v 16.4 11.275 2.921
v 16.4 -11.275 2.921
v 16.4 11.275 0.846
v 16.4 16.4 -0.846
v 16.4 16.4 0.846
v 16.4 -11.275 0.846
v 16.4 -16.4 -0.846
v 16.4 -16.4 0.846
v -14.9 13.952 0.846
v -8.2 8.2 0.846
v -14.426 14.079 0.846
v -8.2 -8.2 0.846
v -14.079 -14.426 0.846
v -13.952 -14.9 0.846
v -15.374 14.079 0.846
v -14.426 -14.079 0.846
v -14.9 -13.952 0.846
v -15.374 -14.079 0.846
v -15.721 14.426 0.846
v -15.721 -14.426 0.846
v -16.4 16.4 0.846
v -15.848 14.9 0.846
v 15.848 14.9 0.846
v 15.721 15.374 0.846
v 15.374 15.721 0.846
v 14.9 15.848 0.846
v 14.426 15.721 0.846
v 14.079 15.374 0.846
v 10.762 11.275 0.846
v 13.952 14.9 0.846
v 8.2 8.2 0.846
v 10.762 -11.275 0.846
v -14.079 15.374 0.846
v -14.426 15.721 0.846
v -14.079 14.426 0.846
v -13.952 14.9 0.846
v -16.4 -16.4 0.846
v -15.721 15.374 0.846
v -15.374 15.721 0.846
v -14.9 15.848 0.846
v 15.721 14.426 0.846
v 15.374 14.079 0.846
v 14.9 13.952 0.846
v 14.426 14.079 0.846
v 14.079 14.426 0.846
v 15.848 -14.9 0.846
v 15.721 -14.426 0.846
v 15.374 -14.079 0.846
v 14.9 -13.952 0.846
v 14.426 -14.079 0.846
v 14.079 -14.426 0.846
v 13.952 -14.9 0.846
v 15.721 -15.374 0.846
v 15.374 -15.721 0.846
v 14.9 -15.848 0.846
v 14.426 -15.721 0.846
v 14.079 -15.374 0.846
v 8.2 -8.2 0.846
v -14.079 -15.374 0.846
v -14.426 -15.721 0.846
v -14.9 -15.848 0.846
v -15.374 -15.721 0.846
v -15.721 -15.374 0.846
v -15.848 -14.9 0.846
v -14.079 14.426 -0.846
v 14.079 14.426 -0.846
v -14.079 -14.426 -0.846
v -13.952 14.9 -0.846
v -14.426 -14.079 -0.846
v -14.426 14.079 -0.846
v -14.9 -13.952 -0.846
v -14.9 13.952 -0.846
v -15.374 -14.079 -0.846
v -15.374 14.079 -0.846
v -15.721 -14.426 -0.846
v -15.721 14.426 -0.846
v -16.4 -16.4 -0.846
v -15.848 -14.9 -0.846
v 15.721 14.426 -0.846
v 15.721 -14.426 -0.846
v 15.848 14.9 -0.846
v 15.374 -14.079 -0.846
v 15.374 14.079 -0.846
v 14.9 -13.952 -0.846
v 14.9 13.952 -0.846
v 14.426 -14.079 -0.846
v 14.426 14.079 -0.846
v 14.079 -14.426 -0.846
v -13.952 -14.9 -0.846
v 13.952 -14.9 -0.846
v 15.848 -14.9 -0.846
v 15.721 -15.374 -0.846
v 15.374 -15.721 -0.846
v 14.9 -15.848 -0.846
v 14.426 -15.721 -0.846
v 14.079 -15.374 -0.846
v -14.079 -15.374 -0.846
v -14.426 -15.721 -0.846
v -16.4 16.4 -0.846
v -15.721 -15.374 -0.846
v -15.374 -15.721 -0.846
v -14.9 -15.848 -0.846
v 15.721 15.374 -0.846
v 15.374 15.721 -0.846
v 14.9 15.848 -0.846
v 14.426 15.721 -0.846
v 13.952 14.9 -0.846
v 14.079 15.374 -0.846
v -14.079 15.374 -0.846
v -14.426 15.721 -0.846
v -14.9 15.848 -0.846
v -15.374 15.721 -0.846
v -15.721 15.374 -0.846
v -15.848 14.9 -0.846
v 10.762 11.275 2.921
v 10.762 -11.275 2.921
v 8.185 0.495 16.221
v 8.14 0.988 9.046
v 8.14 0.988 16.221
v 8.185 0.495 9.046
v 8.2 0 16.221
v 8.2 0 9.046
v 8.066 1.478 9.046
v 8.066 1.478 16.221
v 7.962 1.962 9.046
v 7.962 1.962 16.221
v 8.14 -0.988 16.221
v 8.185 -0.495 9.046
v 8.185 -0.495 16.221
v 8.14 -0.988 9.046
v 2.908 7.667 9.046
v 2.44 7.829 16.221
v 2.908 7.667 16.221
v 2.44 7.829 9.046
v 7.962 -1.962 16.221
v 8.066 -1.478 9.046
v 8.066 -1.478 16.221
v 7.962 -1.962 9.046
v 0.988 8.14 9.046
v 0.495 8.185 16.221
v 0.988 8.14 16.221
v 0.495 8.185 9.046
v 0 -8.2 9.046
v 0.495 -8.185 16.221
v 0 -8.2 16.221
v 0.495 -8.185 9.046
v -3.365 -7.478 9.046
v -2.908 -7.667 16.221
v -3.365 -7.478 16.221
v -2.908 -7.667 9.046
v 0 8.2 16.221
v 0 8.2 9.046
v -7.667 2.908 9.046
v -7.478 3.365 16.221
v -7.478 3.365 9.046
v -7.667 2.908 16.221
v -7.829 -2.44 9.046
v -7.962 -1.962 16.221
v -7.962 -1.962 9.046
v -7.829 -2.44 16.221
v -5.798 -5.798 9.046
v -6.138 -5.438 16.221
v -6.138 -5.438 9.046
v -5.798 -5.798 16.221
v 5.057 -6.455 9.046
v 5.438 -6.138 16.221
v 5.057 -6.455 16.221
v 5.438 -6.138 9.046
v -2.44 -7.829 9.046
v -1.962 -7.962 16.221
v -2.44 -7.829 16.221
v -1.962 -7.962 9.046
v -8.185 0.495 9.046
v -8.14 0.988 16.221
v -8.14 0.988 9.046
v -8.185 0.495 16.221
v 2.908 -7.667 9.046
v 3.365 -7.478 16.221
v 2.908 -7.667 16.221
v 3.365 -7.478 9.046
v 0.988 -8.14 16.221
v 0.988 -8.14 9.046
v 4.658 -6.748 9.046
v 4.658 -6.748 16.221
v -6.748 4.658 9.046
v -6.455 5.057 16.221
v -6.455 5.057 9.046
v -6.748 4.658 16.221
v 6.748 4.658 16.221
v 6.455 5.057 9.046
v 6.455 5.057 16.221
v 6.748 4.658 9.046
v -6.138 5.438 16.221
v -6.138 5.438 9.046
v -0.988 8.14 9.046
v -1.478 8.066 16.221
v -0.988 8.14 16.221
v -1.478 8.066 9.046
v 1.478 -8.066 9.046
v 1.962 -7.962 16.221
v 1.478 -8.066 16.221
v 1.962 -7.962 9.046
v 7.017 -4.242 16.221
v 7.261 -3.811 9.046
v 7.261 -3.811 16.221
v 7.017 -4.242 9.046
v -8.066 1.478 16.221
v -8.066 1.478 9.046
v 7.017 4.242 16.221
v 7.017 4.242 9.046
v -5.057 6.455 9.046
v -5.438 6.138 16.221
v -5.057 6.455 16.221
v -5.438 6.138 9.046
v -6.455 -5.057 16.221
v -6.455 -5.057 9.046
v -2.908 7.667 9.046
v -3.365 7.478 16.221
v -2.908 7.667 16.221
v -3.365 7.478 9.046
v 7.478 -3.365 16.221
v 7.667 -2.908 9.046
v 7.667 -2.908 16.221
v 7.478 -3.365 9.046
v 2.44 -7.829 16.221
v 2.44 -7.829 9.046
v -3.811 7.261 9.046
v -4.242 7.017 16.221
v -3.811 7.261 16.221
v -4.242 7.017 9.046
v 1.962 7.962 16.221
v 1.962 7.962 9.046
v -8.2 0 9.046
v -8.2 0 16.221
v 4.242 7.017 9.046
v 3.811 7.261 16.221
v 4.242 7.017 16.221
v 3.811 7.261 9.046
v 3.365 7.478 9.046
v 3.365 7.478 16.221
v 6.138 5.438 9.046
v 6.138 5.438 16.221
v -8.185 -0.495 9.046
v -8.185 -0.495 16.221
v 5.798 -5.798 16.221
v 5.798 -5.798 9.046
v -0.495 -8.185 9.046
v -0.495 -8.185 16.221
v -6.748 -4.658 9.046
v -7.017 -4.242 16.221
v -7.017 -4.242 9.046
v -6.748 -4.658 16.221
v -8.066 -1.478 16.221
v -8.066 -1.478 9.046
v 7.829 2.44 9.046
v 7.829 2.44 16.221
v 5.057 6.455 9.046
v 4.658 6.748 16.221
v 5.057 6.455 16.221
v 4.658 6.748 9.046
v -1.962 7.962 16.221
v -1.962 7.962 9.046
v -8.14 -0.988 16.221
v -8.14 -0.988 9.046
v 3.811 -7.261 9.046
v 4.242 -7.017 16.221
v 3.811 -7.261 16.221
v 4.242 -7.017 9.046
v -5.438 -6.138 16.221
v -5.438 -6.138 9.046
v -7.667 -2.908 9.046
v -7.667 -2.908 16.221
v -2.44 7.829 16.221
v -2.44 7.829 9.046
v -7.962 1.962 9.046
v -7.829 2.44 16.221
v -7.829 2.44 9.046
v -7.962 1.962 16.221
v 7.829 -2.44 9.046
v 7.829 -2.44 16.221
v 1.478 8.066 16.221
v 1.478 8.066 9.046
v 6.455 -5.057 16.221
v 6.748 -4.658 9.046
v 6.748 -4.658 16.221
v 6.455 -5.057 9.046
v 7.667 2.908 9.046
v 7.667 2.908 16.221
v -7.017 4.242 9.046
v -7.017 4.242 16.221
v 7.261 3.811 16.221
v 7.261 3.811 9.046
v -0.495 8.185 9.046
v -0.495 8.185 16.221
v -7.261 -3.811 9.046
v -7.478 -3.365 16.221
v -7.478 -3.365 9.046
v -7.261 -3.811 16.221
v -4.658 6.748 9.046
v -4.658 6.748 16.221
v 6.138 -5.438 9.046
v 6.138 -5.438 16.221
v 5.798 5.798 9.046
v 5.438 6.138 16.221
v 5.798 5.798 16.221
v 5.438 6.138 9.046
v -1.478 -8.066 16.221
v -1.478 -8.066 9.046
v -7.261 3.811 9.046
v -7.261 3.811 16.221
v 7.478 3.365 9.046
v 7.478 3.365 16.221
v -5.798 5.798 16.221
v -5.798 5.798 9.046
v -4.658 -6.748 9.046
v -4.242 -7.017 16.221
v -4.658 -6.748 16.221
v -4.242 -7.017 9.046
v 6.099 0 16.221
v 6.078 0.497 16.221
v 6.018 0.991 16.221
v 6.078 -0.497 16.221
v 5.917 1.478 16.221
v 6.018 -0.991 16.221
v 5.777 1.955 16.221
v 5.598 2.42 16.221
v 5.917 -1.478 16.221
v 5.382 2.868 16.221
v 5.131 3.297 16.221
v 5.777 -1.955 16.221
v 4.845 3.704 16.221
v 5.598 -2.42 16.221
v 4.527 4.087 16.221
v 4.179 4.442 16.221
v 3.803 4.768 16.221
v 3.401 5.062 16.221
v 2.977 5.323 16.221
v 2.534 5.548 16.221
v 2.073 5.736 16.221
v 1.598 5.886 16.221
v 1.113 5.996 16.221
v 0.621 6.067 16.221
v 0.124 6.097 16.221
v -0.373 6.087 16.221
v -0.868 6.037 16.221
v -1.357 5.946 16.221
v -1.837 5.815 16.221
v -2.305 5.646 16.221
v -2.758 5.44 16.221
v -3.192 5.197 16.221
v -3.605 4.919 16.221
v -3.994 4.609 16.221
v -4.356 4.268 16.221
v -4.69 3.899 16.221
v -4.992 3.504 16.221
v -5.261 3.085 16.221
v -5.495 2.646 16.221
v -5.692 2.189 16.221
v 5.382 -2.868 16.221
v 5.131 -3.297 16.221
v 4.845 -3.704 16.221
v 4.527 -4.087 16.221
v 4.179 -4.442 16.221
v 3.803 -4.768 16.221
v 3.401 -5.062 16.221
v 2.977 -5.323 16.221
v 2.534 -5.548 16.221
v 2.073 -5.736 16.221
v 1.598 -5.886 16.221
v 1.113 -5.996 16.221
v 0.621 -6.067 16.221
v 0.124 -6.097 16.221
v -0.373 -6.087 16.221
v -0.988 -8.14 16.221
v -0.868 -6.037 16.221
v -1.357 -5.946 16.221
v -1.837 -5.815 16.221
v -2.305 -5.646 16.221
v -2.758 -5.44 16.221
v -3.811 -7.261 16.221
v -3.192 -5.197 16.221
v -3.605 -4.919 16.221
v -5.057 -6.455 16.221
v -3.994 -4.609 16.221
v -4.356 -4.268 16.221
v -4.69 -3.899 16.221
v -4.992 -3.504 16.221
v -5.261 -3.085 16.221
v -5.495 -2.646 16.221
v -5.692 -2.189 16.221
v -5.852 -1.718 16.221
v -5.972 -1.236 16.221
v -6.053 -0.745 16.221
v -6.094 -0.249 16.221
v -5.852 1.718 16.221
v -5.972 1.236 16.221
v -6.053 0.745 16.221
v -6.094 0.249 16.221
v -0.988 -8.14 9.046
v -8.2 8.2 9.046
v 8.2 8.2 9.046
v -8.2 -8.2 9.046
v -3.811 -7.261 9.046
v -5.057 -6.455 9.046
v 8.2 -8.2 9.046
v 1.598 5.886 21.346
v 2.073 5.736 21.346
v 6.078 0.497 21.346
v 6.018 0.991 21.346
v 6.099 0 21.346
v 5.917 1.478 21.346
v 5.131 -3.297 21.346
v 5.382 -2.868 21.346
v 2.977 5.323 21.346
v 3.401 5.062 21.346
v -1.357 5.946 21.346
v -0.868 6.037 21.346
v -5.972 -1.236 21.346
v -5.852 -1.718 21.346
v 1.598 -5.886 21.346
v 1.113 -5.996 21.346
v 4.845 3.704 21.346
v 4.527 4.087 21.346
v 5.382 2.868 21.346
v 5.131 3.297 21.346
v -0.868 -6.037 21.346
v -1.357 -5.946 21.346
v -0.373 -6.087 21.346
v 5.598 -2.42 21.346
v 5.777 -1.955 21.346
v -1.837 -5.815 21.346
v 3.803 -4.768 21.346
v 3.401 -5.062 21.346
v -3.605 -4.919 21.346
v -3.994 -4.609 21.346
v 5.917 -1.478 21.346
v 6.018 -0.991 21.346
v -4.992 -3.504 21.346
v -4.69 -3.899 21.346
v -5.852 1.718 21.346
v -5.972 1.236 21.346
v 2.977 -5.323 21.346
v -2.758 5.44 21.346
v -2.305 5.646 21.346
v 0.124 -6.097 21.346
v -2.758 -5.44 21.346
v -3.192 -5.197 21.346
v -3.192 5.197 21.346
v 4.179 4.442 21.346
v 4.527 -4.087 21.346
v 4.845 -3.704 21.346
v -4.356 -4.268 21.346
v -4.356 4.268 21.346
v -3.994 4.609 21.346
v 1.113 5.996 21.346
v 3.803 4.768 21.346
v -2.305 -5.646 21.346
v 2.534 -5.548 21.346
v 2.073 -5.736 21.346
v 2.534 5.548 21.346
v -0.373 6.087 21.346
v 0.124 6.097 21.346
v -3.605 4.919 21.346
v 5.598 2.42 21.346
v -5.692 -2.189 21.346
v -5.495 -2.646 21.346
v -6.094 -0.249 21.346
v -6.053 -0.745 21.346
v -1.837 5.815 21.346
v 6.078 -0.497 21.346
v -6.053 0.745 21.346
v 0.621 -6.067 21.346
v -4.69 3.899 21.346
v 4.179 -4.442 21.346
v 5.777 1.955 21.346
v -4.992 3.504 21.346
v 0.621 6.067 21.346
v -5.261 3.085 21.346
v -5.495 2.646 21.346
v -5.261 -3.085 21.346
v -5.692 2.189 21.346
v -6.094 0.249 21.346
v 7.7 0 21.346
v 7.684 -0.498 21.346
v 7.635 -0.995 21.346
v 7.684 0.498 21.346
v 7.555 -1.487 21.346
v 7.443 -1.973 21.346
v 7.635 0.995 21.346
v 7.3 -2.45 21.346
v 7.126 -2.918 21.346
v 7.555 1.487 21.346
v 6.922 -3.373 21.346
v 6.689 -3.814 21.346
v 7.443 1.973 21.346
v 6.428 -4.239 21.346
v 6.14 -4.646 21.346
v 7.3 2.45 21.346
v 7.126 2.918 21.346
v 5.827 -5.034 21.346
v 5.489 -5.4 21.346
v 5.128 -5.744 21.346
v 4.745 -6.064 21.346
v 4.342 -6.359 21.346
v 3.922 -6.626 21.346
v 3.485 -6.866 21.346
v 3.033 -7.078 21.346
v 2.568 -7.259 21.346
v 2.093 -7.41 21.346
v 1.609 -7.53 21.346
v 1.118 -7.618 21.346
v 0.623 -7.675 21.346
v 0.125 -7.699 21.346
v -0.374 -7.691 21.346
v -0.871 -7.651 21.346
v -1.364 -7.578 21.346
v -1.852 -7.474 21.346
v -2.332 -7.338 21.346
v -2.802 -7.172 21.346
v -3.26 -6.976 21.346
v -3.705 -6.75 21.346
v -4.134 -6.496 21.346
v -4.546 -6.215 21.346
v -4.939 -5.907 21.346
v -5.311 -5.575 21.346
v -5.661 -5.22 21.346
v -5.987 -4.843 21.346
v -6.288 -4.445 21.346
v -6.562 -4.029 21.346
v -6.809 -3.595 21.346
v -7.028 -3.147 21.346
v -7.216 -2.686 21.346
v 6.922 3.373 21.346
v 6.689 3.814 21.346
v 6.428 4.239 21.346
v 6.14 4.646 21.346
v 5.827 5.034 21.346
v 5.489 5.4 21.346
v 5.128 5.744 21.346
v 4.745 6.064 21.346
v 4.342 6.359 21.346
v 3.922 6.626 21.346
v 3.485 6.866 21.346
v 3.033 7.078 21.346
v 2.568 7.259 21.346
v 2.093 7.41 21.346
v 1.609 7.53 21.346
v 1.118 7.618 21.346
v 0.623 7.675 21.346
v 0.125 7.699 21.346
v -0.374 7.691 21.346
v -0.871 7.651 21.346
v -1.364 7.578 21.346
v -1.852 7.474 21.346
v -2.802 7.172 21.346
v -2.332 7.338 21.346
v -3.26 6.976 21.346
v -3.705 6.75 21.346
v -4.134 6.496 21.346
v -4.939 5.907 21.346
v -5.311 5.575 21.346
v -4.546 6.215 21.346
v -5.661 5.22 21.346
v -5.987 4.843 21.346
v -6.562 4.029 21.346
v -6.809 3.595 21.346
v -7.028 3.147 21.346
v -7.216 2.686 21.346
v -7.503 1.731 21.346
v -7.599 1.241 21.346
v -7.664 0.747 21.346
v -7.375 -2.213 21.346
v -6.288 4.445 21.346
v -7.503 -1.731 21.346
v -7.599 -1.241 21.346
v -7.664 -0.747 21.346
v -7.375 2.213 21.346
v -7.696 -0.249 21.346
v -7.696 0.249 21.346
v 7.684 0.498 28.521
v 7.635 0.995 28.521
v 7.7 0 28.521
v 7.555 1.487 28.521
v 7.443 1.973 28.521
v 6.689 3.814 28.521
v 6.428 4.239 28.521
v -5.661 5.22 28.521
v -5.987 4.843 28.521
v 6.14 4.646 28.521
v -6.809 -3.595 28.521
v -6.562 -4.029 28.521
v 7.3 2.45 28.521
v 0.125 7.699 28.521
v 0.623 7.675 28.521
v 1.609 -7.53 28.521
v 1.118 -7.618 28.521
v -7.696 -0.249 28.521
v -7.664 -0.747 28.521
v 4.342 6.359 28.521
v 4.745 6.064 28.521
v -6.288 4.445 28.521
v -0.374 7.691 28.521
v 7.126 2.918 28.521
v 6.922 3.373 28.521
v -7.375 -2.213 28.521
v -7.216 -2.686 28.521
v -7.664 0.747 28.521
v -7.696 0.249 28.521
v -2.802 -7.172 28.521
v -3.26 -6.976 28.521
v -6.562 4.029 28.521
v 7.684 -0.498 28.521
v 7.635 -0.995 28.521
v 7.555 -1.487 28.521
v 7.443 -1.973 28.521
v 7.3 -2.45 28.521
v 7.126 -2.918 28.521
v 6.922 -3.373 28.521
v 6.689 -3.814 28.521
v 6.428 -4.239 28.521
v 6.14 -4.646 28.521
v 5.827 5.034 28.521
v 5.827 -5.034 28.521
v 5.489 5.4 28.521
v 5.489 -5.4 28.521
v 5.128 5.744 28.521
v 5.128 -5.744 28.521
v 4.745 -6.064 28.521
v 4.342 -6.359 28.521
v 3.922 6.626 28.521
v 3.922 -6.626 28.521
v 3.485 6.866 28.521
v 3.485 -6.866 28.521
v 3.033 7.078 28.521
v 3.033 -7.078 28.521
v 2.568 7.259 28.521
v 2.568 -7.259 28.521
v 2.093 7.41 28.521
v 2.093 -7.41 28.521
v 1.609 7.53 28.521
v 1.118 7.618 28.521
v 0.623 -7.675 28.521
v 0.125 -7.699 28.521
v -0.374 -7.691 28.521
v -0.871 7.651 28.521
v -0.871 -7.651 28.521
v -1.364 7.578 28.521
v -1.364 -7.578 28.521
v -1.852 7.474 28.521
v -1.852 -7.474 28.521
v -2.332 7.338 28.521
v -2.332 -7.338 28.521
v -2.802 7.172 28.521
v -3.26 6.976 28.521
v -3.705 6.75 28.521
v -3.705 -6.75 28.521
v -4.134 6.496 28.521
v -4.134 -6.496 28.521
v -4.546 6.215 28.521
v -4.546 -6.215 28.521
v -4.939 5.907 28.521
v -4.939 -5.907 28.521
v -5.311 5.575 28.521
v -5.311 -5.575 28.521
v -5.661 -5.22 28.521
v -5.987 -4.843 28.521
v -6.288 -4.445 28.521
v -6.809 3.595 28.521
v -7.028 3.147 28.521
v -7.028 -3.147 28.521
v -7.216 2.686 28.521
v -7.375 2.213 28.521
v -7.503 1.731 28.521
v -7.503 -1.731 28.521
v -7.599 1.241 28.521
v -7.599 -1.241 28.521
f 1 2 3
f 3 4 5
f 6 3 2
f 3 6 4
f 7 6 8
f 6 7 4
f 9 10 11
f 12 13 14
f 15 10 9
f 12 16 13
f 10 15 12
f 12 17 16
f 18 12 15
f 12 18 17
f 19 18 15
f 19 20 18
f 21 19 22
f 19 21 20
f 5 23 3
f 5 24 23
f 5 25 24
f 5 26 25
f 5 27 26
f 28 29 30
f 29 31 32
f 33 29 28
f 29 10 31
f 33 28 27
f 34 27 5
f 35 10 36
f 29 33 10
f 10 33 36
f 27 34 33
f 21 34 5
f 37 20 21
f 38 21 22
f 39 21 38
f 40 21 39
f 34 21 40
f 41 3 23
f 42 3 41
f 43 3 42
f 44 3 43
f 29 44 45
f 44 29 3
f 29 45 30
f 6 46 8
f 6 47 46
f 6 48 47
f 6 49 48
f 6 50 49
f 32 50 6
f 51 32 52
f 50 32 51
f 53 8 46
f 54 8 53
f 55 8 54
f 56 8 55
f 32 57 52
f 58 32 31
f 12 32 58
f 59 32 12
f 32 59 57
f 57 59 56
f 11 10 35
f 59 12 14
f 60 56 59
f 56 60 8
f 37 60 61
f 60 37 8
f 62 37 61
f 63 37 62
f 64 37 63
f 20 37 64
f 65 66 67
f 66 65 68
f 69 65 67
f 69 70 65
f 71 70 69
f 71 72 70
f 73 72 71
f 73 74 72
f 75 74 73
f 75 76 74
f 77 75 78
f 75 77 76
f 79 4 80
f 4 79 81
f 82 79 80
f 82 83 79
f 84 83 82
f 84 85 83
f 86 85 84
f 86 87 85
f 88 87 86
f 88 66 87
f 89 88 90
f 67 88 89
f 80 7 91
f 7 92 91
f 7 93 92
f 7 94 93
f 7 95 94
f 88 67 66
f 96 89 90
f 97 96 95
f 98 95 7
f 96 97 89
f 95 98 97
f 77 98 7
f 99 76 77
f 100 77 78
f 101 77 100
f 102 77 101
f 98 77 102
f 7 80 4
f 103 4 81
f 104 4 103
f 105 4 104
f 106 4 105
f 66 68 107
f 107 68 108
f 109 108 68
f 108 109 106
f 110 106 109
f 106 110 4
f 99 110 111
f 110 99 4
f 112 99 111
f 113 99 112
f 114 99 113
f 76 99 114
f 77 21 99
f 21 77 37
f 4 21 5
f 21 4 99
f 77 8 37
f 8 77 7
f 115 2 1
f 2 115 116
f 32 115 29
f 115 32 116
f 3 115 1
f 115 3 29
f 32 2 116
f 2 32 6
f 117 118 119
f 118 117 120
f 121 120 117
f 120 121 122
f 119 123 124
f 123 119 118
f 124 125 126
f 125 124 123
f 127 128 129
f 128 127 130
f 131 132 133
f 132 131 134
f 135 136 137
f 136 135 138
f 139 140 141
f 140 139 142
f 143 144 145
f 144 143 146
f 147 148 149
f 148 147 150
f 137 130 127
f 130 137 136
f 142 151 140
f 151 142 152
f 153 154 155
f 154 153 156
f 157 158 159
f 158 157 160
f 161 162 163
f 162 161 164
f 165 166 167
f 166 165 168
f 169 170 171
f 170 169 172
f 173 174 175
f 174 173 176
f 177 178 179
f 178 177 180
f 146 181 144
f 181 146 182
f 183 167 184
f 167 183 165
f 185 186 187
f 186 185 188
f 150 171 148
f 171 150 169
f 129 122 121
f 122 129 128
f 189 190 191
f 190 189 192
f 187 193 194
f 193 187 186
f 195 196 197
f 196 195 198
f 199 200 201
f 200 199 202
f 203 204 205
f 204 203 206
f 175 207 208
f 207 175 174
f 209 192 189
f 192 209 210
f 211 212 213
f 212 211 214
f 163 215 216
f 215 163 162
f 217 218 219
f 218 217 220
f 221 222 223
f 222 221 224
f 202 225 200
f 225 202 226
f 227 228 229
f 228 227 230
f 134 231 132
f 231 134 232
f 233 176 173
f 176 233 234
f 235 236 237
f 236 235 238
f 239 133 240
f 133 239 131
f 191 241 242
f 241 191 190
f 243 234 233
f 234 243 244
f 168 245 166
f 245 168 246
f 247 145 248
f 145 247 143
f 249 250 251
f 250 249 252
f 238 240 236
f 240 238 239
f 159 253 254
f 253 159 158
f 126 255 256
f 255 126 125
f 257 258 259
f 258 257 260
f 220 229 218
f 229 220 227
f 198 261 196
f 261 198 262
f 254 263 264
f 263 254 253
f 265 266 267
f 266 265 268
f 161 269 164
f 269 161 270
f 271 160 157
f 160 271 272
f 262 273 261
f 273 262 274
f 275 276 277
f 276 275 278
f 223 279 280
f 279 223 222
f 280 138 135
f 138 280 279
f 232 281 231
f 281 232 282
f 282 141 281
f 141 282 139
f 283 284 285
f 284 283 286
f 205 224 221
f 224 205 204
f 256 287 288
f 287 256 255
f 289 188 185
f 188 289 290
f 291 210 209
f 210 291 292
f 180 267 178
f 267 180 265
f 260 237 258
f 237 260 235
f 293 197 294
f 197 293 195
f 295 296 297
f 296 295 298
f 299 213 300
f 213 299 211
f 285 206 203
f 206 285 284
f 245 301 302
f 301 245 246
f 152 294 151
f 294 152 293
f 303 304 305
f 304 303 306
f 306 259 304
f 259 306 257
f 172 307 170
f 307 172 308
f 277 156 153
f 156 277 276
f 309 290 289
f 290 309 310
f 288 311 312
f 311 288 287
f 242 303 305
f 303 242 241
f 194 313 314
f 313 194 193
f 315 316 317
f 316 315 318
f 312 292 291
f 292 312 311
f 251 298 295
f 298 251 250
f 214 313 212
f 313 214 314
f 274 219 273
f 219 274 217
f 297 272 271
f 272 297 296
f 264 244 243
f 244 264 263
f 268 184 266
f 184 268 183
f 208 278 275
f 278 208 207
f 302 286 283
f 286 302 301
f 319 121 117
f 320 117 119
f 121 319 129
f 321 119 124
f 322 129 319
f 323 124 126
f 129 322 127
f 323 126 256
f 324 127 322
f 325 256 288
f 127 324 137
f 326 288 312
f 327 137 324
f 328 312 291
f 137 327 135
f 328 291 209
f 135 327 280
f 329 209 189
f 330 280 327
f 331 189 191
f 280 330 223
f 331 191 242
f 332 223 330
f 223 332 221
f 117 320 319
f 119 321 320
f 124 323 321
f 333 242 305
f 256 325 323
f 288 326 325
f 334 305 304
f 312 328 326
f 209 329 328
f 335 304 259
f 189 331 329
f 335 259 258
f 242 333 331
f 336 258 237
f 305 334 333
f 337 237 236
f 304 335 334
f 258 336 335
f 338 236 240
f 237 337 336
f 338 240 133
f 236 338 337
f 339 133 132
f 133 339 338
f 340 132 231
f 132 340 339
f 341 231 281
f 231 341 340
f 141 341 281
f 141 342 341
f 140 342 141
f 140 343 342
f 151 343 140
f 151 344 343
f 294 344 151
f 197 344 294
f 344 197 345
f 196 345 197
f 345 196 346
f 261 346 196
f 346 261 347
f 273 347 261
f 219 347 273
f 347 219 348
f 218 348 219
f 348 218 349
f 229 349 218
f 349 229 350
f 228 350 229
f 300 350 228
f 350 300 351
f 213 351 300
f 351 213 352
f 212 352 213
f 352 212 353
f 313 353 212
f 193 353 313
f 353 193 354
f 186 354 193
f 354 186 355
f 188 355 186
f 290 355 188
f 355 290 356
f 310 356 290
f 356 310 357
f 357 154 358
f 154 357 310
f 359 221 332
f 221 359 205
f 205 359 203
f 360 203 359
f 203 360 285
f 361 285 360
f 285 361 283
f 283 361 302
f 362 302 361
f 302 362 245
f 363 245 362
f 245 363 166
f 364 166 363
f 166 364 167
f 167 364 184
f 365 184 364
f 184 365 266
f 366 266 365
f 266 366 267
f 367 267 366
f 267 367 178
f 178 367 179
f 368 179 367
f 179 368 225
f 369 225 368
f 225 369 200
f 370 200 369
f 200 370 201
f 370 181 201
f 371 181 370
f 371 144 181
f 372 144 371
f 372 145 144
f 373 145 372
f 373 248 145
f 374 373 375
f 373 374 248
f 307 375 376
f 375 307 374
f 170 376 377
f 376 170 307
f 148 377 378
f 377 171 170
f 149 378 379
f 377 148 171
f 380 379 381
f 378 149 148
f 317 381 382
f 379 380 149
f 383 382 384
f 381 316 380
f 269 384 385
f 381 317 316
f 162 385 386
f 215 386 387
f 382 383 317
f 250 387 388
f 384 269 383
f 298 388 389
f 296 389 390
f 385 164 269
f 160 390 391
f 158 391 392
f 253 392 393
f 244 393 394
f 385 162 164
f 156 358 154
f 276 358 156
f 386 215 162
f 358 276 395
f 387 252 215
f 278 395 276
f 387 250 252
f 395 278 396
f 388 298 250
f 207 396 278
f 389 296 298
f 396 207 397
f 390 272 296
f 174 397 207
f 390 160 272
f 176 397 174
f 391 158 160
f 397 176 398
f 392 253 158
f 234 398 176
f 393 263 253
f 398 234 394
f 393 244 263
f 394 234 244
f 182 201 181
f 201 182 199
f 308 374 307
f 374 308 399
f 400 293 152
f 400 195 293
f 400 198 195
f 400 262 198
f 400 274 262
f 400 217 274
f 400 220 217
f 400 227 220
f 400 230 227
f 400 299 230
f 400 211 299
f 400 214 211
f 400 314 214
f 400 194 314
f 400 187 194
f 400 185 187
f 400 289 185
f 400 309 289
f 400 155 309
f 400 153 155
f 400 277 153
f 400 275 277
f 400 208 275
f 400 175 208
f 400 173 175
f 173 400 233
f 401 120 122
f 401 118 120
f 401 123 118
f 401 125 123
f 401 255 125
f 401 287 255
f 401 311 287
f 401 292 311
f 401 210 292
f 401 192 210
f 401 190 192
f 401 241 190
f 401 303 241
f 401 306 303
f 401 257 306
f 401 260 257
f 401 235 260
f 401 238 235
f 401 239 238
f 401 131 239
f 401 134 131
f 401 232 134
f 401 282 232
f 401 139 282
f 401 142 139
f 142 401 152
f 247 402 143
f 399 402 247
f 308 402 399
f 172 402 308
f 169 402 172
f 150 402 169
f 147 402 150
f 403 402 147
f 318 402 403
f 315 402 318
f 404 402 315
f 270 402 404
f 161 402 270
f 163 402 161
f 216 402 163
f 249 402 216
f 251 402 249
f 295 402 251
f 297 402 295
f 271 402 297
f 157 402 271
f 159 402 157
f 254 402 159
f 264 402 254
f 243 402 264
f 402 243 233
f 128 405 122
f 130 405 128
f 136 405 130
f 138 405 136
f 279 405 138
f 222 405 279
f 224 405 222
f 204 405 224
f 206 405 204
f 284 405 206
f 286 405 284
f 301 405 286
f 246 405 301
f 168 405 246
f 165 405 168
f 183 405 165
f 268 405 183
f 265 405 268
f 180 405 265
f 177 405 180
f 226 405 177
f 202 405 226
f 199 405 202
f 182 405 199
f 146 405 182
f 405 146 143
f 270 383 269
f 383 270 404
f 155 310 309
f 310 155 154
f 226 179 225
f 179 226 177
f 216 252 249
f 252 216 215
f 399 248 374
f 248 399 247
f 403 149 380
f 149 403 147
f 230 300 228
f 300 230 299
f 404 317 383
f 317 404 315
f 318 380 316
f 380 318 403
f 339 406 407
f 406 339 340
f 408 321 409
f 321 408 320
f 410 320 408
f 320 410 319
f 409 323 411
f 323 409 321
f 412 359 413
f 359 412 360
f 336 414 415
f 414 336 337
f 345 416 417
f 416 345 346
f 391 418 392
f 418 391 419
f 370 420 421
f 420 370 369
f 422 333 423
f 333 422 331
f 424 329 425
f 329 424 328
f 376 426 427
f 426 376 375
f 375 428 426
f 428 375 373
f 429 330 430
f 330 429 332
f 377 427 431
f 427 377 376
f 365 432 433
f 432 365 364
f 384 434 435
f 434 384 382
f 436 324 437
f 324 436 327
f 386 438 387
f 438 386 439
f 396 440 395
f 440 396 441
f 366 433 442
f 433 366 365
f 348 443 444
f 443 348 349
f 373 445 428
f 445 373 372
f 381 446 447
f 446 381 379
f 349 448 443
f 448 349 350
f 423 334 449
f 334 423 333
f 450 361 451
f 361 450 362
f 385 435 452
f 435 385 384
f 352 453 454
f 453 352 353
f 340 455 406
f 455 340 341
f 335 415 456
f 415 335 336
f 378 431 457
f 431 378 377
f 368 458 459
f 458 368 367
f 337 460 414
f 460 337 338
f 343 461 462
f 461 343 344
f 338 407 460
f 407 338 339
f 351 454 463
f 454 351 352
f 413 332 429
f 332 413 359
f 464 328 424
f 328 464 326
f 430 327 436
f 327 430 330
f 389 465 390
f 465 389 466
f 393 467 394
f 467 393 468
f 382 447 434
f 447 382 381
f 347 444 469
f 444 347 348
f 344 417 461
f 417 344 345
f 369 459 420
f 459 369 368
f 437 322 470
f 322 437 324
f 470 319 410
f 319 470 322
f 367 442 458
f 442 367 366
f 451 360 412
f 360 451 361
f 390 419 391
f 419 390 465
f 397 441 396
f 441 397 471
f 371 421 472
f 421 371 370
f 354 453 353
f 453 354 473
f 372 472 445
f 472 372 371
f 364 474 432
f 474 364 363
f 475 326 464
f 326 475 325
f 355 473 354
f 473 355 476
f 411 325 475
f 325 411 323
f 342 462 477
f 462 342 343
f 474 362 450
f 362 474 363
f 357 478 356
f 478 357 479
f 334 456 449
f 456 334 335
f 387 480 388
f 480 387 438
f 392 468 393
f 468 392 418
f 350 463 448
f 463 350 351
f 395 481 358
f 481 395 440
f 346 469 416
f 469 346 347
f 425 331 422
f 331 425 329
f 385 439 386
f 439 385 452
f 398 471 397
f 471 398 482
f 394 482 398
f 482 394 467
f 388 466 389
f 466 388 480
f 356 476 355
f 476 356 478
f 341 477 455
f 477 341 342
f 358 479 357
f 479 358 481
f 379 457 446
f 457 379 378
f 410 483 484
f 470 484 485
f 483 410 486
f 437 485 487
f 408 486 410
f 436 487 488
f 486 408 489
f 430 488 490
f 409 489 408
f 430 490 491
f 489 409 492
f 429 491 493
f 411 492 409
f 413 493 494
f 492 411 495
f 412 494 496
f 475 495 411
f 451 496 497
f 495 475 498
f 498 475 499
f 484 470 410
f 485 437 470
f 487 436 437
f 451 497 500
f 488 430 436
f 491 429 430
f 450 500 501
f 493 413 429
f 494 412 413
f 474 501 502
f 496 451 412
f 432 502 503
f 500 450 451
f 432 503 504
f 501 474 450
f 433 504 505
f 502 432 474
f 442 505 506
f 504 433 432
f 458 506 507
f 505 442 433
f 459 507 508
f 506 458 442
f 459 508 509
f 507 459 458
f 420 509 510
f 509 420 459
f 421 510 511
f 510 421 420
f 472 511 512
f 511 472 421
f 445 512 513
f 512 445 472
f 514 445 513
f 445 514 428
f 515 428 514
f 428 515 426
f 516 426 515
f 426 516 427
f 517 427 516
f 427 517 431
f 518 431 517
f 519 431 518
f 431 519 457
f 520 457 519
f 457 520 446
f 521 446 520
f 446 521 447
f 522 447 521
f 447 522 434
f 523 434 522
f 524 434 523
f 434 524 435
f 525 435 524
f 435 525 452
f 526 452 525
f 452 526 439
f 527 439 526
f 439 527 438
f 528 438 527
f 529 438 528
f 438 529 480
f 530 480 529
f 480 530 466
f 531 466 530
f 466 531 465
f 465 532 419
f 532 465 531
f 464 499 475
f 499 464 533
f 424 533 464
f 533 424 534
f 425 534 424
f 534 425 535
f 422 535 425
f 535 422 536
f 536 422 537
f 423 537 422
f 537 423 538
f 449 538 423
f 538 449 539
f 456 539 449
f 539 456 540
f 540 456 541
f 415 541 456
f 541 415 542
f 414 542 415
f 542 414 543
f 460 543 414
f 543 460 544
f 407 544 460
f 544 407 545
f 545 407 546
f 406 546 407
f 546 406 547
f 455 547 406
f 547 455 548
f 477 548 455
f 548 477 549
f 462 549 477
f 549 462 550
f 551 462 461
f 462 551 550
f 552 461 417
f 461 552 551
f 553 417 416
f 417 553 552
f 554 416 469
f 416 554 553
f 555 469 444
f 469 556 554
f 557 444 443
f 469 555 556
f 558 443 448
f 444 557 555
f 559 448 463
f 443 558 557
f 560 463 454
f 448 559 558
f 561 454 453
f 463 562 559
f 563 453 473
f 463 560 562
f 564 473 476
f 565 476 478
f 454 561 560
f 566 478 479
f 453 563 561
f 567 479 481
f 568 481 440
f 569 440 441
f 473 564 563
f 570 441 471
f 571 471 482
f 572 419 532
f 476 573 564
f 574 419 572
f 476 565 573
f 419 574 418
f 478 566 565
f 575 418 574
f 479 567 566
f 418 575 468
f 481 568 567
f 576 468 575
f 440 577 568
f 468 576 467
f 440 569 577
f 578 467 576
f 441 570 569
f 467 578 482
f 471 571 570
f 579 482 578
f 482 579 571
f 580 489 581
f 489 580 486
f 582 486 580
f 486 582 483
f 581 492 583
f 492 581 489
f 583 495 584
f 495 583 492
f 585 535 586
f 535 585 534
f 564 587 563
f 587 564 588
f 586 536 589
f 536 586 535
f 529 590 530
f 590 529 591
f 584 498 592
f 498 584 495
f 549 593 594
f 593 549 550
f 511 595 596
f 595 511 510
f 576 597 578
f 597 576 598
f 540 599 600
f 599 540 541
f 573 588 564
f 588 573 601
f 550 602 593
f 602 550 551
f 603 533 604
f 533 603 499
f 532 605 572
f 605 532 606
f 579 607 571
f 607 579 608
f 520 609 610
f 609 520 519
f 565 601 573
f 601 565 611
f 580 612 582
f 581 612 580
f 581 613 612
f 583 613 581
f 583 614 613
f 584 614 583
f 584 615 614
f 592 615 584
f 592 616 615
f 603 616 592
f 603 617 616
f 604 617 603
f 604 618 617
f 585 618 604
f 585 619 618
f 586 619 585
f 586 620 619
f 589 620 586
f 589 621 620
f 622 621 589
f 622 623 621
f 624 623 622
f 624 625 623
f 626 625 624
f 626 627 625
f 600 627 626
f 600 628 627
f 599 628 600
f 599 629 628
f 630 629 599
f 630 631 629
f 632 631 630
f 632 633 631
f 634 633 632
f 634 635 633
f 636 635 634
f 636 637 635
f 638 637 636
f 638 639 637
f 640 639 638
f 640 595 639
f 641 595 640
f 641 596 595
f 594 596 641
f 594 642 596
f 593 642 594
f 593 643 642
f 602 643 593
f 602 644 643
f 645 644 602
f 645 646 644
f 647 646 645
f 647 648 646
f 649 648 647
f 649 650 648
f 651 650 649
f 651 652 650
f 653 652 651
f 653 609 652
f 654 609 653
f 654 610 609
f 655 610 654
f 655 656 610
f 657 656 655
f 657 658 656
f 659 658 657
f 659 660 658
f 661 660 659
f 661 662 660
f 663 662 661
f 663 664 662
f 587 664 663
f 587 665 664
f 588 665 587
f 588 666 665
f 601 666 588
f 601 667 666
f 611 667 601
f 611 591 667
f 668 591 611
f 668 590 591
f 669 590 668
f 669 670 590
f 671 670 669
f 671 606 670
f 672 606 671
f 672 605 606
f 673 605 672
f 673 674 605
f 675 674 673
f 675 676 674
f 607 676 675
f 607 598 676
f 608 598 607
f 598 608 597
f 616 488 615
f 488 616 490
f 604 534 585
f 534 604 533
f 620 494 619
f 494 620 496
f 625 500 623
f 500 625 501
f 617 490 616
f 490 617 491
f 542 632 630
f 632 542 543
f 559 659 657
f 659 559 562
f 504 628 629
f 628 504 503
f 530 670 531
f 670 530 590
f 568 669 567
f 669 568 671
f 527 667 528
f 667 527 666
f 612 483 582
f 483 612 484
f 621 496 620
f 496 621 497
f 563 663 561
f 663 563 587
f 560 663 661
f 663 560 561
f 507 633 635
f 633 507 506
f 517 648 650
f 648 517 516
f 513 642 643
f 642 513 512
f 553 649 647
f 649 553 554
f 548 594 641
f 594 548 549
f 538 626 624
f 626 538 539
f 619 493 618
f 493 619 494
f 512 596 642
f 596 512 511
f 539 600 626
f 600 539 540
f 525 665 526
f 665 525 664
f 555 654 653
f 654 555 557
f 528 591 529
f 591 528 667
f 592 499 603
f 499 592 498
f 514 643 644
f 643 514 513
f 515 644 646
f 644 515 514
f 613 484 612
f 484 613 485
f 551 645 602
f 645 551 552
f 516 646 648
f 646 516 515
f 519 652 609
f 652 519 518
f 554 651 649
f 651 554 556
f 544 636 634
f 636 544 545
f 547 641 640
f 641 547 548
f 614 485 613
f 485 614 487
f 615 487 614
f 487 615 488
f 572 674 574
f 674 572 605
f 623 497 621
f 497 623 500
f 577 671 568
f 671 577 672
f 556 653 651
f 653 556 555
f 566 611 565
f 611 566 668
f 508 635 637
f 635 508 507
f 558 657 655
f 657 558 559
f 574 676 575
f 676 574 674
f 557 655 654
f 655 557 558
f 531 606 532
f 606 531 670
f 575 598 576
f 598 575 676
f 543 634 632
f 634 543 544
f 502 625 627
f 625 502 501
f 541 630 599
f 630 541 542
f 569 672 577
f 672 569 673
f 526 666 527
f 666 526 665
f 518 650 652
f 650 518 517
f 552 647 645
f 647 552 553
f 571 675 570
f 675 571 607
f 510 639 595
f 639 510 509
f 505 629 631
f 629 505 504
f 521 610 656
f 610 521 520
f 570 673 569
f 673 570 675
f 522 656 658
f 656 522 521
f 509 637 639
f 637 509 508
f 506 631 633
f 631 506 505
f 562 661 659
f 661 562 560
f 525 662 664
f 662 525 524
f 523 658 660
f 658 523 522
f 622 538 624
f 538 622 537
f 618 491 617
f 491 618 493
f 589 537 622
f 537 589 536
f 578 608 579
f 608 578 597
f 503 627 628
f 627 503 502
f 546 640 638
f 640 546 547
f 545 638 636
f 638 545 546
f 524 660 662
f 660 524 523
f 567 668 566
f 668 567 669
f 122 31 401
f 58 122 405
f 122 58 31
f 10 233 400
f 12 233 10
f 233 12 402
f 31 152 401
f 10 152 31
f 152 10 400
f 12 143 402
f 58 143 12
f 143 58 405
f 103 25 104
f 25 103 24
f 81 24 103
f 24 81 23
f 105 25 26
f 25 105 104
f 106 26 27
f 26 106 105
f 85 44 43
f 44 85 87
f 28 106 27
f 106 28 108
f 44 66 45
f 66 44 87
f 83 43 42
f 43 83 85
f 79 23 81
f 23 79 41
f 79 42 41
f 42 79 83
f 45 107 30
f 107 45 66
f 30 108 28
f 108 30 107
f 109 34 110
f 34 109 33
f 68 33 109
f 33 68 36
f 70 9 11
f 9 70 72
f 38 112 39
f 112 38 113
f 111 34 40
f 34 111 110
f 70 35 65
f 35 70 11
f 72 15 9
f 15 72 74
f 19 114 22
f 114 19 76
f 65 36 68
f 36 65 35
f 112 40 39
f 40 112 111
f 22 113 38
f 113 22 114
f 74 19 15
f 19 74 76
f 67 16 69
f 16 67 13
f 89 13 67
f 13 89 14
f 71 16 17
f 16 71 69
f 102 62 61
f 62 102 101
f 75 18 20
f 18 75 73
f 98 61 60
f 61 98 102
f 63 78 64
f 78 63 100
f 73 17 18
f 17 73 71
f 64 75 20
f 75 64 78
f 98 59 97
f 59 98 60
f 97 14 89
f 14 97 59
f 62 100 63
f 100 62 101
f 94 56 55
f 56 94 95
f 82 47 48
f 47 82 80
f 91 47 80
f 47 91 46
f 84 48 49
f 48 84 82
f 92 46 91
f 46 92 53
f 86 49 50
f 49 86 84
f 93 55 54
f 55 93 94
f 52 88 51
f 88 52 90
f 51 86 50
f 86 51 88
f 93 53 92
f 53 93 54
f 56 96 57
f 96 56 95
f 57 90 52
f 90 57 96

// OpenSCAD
////////////////////////// VARIAVEIS ////////////////////////////////

$fa = 1.5;
$fs = 0.5;

FC = 1.025;

// Placa de circuito impresso
cameraCircuitoLar = 32 * FC ;
cameraCircuitoProfun = 32 * FC ;
cameraCircuitoAlt = 1.65 * FC ;


// Base da Lente
cameraBasevLar = 16 * FC ;
cameraBaseProfun = 16 * FC ;
cameraBaseAlt = 8 * FC ;

// Lente
cameraLenteLar = 16 * FC ;
cameraLenteAlt = 7 * FC ;

//Lente Foco
cameraLenteFocoLar = 11.90 * FC ;
cameraLenteFocoAlt = 5 * FC ;

// Base da Lente
cameraConecLar = 22 * FC ;
cameraConecProfun = 5.5 * FC ;
cameraConecAlt = 2.4 * FC ;

//Furos
cameraCircuitoFuroLar = 1.85 * FC ;

////////////////////////// MODULOS ////////////////////////////////
module placaCCD(){
        // Placa de circuito impresso
    color ("darkgreen"){ 
        cube( [cameraCircuitoProfun, cameraCircuitoLar, cameraCircuitoAlt] , center = true);
    }    // Conector odo flat cable da camera
    color ("white"){
        translate([ ( cameraCircuitoProfun / 2 ) - ( cameraConecProfun / 2 )  , 0 , cameraCircuitoAlt ]){
            cube([cameraConecProfun, cameraConecLar, cameraConecAlt] , center = true );
        }
    }
}



module CCD(){
    translate ( [ -cameraBasevLar / 2 , -cameraBaseProfun / 2 , cameraCircuitoAlt / 2 ] ){ 
        color ("gray")
        cube([cameraBasevLar, cameraBaseProfun, cameraBaseAlt]);
    }
}


module jogoLentes(){
   translate([ 0 , 0 , ( cameraCircuitoAlt / 2 ) + cameraBaseAlt ]){
       color ("gray")
       cylinder( r = cameraLenteLar / 2 , h = cameraLenteAlt );
    }
    translate([ 0 , 0 , ( cameraCircuitoAlt / 2 ) + cameraBaseAlt + cameraLenteAlt]){
        color("gray")
        cylinder( r = cameraLenteFocoLar / 2 , h = cameraLenteFocoAlt );
    }
    translate([ 0 , 0 , ( cameraCircuitoAlt / 2 ) + cameraBaseAlt+ cameraLenteAlt + cameraLenteFocoAlt ]){
       color ("gray")
       cylinder( r = cameraLenteLar / 2 - 0.5 , h = cameraLenteAlt );
    }    
}


module parafusoBase(){
            // Furos da placa para os parafusos 1
            translate([ ( cameraCircuitoProfun / 2 ) - 1.5 , ( cameraCircuitoLar / 2 ) - 1.5, 0 ]){
               #cylinder( r =  cameraCircuitoFuroLar / 2 , h = cameraCircuitoAlt + 0.25 , center = true);
            }
            // Furos da placa para os parafusos 2
            translate([ ( - cameraCircuitoProfun / 2 ) + 1.5 , ( cameraCircuitoLar / 2 ) - 1.5, 0 ]){
               #cylinder( r =  cameraCircuitoFuroLar / 2 , h = cameraCircuitoAlt + 0.25 , center = true);
            }
            // Furos da placa para os parafusos 3
            translate([ ( - cameraCircuitoProfun / 2 ) + 1.5 , ( - cameraCircuitoLar / 2 ) + 1.5, 0 ]){
               #cylinder( r =  cameraCircuitoFuroLar / 2 , h = cameraCircuitoAlt + 0.25 , center = true);
            }
            // Furos da placa para os parafusos 4
            translate([ ( cameraCircuitoProfun / 2 ) - 1.5 , ( - cameraCircuitoLar / 2 ) + 1.5, 0 ]){
               #cylinder( r =  cameraCircuitoFuroLar / 2 , h = cameraCircuitoAlt + 0.25 , center = true);
            }    
}


module camera(){
    difference(){    
        union(){
            // Placa de circuito impresso
            placaCCD(); 
            // CCD
            CCD();
            // JOGO DE LENTES
            jogoLentes();
        }
            // Retirando os furos para os parafusos
            parafusoBase();
    }
}

////////////////////////// REDERIZACAO ////////////////////////////////
camera();
